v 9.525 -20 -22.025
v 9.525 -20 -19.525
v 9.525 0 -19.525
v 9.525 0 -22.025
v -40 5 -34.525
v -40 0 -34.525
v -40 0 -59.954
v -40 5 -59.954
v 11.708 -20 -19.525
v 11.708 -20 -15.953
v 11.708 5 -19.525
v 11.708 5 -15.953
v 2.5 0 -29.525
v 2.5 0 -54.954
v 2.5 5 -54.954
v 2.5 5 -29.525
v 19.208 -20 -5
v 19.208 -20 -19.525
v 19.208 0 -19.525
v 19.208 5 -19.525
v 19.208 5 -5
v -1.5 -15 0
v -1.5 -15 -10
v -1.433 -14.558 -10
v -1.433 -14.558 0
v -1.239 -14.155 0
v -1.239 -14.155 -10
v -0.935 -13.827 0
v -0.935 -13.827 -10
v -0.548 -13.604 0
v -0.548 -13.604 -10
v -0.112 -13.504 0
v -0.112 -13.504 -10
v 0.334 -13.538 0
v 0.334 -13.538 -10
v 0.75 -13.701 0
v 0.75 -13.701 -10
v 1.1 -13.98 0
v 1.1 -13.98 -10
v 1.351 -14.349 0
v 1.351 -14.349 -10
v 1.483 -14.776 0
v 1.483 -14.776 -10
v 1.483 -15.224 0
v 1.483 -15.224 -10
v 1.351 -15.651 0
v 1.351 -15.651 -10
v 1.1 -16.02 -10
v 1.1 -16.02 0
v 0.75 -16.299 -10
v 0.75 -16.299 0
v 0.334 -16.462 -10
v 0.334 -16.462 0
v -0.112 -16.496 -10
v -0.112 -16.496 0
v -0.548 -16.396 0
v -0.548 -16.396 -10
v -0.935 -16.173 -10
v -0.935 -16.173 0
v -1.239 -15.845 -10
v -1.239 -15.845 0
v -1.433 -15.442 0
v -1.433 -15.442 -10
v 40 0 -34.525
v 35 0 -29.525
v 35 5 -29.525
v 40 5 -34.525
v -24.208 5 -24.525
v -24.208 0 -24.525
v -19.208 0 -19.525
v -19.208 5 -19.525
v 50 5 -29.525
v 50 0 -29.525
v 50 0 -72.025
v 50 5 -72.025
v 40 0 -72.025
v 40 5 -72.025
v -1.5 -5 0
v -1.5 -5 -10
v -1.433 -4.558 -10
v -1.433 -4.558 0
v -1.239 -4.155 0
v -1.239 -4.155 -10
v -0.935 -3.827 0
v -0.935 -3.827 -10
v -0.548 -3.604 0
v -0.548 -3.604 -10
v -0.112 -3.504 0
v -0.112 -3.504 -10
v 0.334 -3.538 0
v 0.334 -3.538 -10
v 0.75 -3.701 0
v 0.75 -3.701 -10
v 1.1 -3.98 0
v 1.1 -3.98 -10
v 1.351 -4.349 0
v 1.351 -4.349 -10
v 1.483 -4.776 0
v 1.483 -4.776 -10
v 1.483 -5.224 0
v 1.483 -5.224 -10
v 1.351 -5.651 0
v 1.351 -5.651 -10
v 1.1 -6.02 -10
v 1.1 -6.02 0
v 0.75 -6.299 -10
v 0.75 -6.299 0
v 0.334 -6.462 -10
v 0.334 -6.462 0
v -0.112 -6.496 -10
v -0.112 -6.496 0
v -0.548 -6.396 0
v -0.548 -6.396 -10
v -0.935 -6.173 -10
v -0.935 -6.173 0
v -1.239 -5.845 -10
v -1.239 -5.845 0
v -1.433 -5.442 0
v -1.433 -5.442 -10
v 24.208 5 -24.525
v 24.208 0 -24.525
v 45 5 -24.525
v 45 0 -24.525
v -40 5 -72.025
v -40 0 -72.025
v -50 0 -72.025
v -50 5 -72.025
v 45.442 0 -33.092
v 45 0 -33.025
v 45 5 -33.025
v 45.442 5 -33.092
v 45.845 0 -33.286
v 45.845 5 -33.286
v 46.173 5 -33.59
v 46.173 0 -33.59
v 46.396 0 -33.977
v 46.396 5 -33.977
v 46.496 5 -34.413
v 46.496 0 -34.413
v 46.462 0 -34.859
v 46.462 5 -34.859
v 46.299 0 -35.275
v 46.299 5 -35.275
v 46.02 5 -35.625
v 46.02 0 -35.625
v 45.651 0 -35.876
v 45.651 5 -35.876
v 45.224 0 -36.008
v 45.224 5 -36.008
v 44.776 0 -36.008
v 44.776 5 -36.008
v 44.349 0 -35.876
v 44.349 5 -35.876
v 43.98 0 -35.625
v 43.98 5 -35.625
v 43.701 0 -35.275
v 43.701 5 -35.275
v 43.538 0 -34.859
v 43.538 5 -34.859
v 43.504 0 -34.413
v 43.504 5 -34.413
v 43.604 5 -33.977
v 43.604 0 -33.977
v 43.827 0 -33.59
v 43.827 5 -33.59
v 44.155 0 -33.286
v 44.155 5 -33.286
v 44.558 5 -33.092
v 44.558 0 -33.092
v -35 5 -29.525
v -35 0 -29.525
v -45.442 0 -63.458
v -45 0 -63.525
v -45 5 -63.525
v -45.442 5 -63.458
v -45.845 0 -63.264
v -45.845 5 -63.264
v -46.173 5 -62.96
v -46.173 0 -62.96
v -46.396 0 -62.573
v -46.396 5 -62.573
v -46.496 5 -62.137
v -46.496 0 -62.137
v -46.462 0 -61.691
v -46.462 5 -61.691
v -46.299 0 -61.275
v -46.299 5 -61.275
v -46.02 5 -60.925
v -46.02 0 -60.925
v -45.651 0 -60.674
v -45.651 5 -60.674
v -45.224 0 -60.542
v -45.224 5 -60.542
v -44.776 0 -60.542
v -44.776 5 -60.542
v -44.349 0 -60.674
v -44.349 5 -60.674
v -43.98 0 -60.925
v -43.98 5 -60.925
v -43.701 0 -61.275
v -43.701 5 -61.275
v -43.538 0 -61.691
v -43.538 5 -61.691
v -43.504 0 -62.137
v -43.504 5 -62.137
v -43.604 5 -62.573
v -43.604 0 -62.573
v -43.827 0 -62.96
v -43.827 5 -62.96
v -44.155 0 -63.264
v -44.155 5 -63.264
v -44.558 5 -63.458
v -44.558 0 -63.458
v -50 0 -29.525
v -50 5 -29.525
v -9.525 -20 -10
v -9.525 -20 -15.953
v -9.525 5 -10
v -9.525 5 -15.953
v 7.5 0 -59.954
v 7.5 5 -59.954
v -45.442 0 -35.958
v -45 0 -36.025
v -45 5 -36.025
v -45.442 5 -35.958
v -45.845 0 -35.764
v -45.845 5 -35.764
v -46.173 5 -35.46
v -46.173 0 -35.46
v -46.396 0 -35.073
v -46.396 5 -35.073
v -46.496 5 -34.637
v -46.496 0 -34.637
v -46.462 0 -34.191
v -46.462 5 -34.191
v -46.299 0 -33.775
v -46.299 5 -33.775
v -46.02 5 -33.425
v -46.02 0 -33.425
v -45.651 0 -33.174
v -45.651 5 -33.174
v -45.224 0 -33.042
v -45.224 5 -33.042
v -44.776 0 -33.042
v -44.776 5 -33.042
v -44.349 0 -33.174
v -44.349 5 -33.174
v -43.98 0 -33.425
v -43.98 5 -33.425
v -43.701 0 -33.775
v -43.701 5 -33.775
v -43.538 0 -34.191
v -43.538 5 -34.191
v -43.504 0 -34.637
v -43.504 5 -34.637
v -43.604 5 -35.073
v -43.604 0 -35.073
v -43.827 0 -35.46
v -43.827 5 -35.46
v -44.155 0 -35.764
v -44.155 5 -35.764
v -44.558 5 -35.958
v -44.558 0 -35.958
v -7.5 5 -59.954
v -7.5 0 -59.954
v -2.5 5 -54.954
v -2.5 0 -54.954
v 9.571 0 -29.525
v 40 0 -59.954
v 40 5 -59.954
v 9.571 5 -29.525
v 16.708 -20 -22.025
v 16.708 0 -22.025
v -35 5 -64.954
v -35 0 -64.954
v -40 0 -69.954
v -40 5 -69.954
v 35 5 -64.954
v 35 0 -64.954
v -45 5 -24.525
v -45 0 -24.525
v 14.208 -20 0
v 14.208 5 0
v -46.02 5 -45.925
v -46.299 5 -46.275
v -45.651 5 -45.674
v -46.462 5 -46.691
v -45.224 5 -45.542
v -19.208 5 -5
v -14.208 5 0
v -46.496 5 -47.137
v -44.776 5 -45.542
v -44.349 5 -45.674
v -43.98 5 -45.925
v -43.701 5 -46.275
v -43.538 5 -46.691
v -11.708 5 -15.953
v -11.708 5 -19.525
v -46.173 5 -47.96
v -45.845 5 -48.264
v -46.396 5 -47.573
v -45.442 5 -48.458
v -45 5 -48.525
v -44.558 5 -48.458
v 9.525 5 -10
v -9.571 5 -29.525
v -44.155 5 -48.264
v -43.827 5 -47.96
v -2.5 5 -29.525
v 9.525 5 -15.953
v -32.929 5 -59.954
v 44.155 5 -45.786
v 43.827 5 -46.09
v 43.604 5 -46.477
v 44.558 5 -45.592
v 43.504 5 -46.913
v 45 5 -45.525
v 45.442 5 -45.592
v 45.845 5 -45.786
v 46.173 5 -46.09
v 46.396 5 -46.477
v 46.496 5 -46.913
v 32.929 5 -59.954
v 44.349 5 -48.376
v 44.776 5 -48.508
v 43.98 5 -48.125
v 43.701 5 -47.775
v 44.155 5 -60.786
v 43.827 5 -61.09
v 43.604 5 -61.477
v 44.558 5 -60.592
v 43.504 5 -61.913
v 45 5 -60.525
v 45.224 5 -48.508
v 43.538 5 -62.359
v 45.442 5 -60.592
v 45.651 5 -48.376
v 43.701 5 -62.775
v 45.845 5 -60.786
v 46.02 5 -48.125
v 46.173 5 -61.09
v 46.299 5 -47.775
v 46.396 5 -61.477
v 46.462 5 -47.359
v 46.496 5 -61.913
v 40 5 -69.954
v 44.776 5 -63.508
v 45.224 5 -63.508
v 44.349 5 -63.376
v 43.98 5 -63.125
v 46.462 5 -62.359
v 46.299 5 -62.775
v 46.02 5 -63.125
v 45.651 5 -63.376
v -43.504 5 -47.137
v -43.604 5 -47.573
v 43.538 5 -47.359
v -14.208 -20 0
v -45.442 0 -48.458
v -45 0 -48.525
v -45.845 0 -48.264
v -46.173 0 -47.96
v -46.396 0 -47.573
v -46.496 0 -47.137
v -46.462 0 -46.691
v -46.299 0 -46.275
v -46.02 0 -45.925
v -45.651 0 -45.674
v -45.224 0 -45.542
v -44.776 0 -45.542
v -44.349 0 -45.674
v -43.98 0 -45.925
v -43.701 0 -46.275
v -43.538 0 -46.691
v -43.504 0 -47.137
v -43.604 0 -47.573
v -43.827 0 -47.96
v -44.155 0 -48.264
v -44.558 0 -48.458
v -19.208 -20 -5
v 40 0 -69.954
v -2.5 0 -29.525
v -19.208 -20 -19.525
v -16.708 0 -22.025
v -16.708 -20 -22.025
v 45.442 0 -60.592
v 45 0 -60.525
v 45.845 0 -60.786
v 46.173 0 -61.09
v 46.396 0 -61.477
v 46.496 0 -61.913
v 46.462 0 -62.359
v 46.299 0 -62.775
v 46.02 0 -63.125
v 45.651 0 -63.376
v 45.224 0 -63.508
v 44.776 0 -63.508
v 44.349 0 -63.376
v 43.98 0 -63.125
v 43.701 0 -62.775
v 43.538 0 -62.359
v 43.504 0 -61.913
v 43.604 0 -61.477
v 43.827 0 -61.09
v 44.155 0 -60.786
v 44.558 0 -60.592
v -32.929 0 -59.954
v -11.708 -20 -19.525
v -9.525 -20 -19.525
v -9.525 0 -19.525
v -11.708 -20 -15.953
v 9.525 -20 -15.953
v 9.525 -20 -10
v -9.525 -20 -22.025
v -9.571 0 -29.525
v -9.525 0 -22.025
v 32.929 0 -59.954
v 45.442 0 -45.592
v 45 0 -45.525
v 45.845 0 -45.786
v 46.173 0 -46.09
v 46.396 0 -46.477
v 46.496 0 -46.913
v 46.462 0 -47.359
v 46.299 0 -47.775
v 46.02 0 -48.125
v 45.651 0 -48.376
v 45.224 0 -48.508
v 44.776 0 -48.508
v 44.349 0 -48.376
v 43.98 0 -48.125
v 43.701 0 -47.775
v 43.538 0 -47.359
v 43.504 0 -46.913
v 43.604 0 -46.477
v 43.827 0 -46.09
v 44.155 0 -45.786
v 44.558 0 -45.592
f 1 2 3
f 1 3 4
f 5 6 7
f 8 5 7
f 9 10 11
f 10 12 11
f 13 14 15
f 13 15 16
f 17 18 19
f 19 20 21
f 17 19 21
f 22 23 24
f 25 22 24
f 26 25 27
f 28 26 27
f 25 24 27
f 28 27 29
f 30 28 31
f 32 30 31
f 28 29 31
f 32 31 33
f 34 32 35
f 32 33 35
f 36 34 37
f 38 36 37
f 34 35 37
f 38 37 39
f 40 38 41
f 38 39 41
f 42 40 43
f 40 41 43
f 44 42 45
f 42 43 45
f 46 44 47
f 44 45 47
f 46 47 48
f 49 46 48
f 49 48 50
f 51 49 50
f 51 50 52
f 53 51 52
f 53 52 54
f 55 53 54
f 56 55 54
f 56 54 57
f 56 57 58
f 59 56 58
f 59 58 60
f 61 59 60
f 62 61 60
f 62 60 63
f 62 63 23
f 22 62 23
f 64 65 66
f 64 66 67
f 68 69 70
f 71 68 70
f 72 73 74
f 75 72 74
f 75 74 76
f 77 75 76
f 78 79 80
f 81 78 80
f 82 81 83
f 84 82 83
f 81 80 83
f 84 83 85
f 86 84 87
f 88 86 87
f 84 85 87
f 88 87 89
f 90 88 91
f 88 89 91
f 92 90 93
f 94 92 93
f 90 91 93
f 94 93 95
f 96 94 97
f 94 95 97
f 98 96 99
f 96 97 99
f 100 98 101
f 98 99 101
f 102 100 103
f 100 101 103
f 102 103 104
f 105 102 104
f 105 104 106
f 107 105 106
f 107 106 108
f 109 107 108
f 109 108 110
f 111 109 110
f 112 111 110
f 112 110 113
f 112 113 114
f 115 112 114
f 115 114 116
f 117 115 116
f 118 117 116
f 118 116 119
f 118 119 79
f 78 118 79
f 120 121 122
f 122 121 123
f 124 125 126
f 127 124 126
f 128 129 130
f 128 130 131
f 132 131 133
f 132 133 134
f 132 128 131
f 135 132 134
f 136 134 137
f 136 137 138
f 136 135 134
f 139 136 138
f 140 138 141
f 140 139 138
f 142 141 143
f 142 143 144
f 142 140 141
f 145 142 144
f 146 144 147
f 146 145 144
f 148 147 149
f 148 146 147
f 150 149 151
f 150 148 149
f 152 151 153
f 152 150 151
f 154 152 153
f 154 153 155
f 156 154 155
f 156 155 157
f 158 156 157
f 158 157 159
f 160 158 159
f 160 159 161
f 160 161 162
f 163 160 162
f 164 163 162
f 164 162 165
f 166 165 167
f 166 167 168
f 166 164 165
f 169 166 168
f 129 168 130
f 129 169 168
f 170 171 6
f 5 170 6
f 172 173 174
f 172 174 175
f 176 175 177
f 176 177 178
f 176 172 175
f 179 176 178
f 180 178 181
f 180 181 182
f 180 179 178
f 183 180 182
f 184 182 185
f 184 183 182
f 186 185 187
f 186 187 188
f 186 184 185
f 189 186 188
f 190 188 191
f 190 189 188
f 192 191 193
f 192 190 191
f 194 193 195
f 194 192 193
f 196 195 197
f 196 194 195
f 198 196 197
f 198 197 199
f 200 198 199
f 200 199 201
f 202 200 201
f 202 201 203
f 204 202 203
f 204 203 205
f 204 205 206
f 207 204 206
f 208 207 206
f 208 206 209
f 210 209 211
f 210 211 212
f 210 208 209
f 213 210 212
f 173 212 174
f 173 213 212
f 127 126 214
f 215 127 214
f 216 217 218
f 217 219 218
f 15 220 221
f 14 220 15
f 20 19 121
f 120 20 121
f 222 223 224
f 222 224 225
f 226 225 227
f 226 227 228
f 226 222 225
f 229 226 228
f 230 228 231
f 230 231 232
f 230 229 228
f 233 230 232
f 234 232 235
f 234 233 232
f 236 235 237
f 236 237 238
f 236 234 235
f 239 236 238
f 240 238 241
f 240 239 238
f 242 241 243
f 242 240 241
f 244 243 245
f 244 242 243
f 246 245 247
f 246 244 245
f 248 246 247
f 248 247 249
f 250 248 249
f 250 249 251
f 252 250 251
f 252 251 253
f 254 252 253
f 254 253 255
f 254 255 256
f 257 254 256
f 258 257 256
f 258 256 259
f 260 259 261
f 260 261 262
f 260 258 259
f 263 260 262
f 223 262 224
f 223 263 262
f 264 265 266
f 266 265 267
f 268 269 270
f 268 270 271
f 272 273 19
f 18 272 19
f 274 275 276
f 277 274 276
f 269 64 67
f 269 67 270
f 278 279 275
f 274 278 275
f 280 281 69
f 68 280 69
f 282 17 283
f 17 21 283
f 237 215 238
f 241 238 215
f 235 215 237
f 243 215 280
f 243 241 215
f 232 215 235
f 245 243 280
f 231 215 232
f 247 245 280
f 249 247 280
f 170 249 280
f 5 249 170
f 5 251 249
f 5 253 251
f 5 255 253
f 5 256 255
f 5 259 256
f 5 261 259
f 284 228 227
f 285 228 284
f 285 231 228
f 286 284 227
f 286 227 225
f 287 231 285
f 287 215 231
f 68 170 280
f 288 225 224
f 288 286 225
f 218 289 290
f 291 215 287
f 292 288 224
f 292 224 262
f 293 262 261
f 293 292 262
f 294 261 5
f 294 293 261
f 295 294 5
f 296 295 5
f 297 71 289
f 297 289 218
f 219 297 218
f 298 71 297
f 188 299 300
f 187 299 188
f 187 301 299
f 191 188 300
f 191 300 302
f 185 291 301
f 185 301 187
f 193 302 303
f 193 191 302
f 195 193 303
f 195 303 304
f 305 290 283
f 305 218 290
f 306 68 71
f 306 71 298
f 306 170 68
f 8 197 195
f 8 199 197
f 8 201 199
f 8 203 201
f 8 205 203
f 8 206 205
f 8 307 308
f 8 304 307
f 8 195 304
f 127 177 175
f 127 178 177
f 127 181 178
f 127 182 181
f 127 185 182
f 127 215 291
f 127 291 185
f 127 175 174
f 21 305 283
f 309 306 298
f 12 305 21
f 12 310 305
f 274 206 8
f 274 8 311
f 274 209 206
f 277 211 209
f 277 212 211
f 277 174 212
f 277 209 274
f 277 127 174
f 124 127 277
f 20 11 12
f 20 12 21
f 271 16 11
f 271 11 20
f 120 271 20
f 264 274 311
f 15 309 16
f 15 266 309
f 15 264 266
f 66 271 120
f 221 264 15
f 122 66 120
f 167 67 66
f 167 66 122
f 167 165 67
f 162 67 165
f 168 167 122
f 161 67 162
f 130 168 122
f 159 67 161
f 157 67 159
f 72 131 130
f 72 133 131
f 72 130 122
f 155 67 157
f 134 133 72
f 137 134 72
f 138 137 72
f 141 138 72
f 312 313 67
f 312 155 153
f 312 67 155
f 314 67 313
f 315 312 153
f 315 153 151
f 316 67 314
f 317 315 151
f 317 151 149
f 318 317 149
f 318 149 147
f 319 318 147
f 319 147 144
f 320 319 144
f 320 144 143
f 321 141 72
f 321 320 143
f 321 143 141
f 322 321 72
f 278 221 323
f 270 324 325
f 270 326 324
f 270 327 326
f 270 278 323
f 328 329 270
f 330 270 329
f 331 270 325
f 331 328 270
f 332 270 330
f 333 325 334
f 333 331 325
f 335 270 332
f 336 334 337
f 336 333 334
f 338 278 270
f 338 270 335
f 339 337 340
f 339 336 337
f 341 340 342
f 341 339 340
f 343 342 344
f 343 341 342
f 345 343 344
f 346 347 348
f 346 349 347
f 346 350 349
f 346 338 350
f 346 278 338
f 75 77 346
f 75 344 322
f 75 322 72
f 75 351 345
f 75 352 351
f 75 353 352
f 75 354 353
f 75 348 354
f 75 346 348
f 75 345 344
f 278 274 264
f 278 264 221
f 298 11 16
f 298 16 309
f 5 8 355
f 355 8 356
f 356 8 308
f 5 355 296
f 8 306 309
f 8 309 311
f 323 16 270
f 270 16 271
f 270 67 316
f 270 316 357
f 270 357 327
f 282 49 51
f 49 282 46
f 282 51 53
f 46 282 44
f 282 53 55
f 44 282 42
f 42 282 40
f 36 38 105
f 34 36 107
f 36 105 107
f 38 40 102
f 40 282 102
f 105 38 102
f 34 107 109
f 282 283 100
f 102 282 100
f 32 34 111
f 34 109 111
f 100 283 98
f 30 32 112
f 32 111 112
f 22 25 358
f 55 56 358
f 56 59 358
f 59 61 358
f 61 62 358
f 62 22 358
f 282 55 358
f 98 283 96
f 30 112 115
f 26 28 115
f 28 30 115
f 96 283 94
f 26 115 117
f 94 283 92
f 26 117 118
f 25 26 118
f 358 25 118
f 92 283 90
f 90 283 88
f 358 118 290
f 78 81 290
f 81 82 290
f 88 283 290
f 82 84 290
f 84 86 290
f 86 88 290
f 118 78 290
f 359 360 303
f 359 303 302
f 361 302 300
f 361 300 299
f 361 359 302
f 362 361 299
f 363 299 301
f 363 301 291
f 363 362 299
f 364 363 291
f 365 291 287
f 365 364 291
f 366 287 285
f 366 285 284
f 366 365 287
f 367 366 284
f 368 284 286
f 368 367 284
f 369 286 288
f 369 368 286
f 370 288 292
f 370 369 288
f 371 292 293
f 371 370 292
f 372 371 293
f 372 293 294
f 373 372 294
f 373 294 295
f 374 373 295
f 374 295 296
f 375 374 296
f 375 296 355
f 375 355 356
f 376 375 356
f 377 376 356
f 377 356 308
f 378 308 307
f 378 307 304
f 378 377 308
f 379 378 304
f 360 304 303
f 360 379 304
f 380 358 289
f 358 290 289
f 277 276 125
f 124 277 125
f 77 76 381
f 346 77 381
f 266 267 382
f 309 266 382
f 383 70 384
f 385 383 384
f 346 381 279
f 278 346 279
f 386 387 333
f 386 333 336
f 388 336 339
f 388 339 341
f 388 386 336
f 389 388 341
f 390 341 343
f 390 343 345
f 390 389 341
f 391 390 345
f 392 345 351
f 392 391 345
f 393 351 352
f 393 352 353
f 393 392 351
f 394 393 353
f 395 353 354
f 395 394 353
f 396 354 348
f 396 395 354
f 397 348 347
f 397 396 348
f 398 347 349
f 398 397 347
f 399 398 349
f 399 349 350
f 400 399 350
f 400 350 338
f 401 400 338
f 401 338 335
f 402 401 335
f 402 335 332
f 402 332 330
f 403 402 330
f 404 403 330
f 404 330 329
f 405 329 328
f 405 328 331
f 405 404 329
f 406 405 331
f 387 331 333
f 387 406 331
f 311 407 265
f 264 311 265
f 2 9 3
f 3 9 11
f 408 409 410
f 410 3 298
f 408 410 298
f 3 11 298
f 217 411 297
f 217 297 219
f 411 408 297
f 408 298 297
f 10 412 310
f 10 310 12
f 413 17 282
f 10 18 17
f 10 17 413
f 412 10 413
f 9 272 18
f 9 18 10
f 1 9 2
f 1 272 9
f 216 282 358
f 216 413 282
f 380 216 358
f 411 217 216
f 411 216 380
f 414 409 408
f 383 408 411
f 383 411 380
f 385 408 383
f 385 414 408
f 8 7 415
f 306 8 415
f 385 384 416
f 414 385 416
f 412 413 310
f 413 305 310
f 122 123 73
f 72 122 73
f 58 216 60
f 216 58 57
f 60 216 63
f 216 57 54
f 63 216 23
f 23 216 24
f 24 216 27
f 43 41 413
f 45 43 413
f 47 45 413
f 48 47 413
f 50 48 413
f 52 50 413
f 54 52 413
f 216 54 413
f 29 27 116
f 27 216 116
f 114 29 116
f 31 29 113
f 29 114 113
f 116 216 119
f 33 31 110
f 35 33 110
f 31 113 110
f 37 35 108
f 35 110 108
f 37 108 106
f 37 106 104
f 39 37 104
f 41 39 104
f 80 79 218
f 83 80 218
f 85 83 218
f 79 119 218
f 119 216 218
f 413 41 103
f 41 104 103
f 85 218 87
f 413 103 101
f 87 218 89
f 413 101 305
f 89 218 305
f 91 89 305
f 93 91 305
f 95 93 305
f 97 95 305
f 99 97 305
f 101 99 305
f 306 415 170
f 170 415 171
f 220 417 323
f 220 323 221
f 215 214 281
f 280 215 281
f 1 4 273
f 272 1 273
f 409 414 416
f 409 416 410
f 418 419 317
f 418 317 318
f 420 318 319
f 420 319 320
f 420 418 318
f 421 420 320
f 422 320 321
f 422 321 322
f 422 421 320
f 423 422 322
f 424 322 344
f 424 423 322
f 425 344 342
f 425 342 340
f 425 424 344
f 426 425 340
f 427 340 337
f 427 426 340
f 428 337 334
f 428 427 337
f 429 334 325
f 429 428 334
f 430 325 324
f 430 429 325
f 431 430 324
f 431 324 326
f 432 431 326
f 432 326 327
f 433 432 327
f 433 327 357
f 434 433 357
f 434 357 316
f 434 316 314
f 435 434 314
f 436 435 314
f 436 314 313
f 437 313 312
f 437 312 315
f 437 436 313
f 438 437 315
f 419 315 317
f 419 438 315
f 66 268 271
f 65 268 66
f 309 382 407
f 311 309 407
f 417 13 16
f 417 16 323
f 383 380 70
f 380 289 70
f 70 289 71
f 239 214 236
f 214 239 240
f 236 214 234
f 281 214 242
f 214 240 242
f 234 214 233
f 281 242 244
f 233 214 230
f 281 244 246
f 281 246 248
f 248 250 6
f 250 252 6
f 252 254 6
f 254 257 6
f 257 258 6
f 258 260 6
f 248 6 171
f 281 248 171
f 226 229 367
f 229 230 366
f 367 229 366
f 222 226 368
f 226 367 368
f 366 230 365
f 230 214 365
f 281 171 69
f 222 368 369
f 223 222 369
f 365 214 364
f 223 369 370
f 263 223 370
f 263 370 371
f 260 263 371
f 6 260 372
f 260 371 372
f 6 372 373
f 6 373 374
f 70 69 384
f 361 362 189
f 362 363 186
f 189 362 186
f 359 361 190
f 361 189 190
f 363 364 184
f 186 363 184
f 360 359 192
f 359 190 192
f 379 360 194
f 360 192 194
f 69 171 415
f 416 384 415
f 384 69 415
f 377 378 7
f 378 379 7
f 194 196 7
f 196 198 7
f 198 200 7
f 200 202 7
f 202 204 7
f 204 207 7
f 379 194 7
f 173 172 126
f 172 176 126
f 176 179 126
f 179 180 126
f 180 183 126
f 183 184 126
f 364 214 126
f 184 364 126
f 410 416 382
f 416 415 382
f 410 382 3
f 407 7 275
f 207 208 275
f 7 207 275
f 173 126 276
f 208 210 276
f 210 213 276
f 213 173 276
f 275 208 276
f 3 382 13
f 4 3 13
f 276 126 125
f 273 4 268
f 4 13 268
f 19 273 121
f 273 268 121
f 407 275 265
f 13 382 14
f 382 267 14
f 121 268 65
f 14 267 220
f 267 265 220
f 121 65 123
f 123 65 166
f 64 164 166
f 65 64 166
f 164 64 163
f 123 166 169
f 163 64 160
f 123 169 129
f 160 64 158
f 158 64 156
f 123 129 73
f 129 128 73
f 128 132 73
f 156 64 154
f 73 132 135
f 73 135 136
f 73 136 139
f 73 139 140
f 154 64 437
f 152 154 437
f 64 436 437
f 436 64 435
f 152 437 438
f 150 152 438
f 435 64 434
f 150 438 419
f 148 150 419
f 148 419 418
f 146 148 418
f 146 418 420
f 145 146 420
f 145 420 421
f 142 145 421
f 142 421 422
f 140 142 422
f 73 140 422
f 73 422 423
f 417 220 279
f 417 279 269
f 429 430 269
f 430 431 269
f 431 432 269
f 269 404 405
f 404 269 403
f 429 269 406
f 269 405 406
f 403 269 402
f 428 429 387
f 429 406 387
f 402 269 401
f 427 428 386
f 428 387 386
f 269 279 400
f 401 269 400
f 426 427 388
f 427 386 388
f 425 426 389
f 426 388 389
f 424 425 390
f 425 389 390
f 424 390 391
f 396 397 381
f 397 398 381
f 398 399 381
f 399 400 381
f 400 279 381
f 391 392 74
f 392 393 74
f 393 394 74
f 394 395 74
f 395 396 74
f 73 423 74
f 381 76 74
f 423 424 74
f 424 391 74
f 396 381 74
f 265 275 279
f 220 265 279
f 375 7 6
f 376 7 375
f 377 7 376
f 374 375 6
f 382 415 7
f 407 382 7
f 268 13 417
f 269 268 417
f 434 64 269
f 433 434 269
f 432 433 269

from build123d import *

# Parameters (mm, degrees)
SKETCH1_R           = 1.5
BOSS_EXTRUDE1_DEPTH = 5
BOSS_EXTRUDE2_DEPTH = 20
CUT_EXTRUDE1_REACH  = 84.141
SKETCH3_R           = 1.5


with BuildPart() as part:
    # Sketch1 → Boss-Extrude1 (new body)
    with BuildSketch(Plane(origin=(0, 0, 0), x_dir=(1, 0, 0), z_dir=(0, 1, 0))):
        Polygon((-14.2078125, 0), (14.2078125, 0), (19.2078125, 5), (19.2078125, 19.525), (24.2078125, 24.525), (45, 24.525), (50, 29.525), (50, 72.025), (40, 72.025), (40, 69.953932188), (35, 64.953932188), (-35, 64.953932188), (-40, 69.953932188), (-40, 72.025), (-50, 72.025), (-50, 29.525), (-45, 24.525), (-24.2078125, 24.525), (-19.2078125, 19.525), (-19.2078125, 5), align=None)
        with Locations(Location((45, 34.525, 0), (0, 0, 270))):
            Circle(SKETCH1_R, mode=Mode.SUBTRACT)
        with Locations(Location((45, 47.025, 0), (0, 0, 270))):
            Circle(SKETCH1_R, mode=Mode.SUBTRACT)
        with Locations(Location((45, 62.025, 0), (0, 0, 270))):
            Circle(SKETCH1_R, mode=Mode.SUBTRACT)
        with Locations(Location((-45, 62.025, 0), (0, 0, 90))):
            Circle(SKETCH1_R, mode=Mode.SUBTRACT)
        with Locations(Location((-45, 47.025, 0), (0, 0, 90))):
            Circle(SKETCH1_R, mode=Mode.SUBTRACT)
        with Locations(Location((-45, 34.525, 0), (0, 0, 90))):
            Circle(SKETCH1_R, mode=Mode.SUBTRACT)
        Polygon((-9.525, 10), (9.525, 10), (9.525, 15.953125), (11.7078125, 15.953125), (11.7078125, 19.525), (-11.7078125, 19.525), (-11.7078125, 15.953125), (-9.525, 15.953125), align=None, mode=Mode.SUBTRACT)
        Polygon((2.5, 54.953932188), (2.5, 29.525), (32.928932188, 59.953932188), (7.5, 59.953932188), align=None, mode=Mode.SUBTRACT)
        Polygon((40, 59.953932188), (9.571067812, 29.525), (35, 29.525), (40, 34.525), align=None, mode=Mode.SUBTRACT)
        Polygon((-40, 34.525), (-40, 59.953932188), (-9.571067812, 29.525), (-35, 29.525), align=None, mode=Mode.SUBTRACT)
        Polygon((-2.5, 29.525), (-32.928932188, 59.953932188), (-7.5, 59.953932188), (-2.5, 54.953932188), align=None, mode=Mode.SUBTRACT)
    extrude(amount=BOSS_EXTRUDE1_DEPTH)

    # Sketch2 → Boss-Extrude2 (add)
    with BuildSketch(Plane(origin=(0, 0, 0), x_dir=(1, 0, 0), z_dir=(0, 1, 0))):
        Polygon((19.2078125, 19.525), (19.2078125, 5), (14.2078125, 0), (-14.2078125, 0), (-19.2078125, 5), (-19.2078125, 19.525), (-16.7078125, 22.025), (-9.525, 22.025), (-9.525, 19.525), (-11.7078125, 19.525), (-11.7078125, 15.953125), (-9.525, 15.953125), (-9.525, 10), (9.525, 10), (9.525, 15.953125), (11.7078125, 15.953125), (11.7078125, 19.525), (9.525, 19.525), (9.525, 22.025), (16.7078125, 22.025), align=None)
    extrude(amount=-BOSS_EXTRUDE2_DEPTH)

    # Sketch3 → Cut-Extrude1 (cut, up to next)
    with BuildSketch(Plane(origin=(0, 0, -10), x_dir=(-1, 0, 0), z_dir=(0, 0, -1)), mode=Mode.PRIVATE) as cut_extrude1_sk1:
        with Locations((0, -15)):
            Circle(SKETCH3_R)
    cut_extrude1_tool1 = extrude(cut_extrude1_sk1.sketch, amount=-CUT_EXTRUDE1_REACH, mode=Mode.PRIVATE) & part.part
    # Sketch3 → Cut-Extrude1 (cut, up to next)
    with BuildSketch(Plane(origin=(0, 0, -10), x_dir=(-1, 0, 0), z_dir=(0, 0, -1)), mode=Mode.PRIVATE) as cut_extrude1_sk2:
        with Locations((0, -5)):
            Circle(SKETCH3_R)
    cut_extrude1_tool2 = extrude(cut_extrude1_sk2.sketch, amount=-CUT_EXTRUDE1_REACH, mode=Mode.PRIVATE) & part.part
    add(cut_extrude1_tool1.solids().sort_by_distance((0, -15, -10))[0], mode=Mode.SUBTRACT)
    add(cut_extrude1_tool2.solids().sort_by_distance((0, -5, -10))[0], mode=Mode.SUBTRACT)


solid = part.part
